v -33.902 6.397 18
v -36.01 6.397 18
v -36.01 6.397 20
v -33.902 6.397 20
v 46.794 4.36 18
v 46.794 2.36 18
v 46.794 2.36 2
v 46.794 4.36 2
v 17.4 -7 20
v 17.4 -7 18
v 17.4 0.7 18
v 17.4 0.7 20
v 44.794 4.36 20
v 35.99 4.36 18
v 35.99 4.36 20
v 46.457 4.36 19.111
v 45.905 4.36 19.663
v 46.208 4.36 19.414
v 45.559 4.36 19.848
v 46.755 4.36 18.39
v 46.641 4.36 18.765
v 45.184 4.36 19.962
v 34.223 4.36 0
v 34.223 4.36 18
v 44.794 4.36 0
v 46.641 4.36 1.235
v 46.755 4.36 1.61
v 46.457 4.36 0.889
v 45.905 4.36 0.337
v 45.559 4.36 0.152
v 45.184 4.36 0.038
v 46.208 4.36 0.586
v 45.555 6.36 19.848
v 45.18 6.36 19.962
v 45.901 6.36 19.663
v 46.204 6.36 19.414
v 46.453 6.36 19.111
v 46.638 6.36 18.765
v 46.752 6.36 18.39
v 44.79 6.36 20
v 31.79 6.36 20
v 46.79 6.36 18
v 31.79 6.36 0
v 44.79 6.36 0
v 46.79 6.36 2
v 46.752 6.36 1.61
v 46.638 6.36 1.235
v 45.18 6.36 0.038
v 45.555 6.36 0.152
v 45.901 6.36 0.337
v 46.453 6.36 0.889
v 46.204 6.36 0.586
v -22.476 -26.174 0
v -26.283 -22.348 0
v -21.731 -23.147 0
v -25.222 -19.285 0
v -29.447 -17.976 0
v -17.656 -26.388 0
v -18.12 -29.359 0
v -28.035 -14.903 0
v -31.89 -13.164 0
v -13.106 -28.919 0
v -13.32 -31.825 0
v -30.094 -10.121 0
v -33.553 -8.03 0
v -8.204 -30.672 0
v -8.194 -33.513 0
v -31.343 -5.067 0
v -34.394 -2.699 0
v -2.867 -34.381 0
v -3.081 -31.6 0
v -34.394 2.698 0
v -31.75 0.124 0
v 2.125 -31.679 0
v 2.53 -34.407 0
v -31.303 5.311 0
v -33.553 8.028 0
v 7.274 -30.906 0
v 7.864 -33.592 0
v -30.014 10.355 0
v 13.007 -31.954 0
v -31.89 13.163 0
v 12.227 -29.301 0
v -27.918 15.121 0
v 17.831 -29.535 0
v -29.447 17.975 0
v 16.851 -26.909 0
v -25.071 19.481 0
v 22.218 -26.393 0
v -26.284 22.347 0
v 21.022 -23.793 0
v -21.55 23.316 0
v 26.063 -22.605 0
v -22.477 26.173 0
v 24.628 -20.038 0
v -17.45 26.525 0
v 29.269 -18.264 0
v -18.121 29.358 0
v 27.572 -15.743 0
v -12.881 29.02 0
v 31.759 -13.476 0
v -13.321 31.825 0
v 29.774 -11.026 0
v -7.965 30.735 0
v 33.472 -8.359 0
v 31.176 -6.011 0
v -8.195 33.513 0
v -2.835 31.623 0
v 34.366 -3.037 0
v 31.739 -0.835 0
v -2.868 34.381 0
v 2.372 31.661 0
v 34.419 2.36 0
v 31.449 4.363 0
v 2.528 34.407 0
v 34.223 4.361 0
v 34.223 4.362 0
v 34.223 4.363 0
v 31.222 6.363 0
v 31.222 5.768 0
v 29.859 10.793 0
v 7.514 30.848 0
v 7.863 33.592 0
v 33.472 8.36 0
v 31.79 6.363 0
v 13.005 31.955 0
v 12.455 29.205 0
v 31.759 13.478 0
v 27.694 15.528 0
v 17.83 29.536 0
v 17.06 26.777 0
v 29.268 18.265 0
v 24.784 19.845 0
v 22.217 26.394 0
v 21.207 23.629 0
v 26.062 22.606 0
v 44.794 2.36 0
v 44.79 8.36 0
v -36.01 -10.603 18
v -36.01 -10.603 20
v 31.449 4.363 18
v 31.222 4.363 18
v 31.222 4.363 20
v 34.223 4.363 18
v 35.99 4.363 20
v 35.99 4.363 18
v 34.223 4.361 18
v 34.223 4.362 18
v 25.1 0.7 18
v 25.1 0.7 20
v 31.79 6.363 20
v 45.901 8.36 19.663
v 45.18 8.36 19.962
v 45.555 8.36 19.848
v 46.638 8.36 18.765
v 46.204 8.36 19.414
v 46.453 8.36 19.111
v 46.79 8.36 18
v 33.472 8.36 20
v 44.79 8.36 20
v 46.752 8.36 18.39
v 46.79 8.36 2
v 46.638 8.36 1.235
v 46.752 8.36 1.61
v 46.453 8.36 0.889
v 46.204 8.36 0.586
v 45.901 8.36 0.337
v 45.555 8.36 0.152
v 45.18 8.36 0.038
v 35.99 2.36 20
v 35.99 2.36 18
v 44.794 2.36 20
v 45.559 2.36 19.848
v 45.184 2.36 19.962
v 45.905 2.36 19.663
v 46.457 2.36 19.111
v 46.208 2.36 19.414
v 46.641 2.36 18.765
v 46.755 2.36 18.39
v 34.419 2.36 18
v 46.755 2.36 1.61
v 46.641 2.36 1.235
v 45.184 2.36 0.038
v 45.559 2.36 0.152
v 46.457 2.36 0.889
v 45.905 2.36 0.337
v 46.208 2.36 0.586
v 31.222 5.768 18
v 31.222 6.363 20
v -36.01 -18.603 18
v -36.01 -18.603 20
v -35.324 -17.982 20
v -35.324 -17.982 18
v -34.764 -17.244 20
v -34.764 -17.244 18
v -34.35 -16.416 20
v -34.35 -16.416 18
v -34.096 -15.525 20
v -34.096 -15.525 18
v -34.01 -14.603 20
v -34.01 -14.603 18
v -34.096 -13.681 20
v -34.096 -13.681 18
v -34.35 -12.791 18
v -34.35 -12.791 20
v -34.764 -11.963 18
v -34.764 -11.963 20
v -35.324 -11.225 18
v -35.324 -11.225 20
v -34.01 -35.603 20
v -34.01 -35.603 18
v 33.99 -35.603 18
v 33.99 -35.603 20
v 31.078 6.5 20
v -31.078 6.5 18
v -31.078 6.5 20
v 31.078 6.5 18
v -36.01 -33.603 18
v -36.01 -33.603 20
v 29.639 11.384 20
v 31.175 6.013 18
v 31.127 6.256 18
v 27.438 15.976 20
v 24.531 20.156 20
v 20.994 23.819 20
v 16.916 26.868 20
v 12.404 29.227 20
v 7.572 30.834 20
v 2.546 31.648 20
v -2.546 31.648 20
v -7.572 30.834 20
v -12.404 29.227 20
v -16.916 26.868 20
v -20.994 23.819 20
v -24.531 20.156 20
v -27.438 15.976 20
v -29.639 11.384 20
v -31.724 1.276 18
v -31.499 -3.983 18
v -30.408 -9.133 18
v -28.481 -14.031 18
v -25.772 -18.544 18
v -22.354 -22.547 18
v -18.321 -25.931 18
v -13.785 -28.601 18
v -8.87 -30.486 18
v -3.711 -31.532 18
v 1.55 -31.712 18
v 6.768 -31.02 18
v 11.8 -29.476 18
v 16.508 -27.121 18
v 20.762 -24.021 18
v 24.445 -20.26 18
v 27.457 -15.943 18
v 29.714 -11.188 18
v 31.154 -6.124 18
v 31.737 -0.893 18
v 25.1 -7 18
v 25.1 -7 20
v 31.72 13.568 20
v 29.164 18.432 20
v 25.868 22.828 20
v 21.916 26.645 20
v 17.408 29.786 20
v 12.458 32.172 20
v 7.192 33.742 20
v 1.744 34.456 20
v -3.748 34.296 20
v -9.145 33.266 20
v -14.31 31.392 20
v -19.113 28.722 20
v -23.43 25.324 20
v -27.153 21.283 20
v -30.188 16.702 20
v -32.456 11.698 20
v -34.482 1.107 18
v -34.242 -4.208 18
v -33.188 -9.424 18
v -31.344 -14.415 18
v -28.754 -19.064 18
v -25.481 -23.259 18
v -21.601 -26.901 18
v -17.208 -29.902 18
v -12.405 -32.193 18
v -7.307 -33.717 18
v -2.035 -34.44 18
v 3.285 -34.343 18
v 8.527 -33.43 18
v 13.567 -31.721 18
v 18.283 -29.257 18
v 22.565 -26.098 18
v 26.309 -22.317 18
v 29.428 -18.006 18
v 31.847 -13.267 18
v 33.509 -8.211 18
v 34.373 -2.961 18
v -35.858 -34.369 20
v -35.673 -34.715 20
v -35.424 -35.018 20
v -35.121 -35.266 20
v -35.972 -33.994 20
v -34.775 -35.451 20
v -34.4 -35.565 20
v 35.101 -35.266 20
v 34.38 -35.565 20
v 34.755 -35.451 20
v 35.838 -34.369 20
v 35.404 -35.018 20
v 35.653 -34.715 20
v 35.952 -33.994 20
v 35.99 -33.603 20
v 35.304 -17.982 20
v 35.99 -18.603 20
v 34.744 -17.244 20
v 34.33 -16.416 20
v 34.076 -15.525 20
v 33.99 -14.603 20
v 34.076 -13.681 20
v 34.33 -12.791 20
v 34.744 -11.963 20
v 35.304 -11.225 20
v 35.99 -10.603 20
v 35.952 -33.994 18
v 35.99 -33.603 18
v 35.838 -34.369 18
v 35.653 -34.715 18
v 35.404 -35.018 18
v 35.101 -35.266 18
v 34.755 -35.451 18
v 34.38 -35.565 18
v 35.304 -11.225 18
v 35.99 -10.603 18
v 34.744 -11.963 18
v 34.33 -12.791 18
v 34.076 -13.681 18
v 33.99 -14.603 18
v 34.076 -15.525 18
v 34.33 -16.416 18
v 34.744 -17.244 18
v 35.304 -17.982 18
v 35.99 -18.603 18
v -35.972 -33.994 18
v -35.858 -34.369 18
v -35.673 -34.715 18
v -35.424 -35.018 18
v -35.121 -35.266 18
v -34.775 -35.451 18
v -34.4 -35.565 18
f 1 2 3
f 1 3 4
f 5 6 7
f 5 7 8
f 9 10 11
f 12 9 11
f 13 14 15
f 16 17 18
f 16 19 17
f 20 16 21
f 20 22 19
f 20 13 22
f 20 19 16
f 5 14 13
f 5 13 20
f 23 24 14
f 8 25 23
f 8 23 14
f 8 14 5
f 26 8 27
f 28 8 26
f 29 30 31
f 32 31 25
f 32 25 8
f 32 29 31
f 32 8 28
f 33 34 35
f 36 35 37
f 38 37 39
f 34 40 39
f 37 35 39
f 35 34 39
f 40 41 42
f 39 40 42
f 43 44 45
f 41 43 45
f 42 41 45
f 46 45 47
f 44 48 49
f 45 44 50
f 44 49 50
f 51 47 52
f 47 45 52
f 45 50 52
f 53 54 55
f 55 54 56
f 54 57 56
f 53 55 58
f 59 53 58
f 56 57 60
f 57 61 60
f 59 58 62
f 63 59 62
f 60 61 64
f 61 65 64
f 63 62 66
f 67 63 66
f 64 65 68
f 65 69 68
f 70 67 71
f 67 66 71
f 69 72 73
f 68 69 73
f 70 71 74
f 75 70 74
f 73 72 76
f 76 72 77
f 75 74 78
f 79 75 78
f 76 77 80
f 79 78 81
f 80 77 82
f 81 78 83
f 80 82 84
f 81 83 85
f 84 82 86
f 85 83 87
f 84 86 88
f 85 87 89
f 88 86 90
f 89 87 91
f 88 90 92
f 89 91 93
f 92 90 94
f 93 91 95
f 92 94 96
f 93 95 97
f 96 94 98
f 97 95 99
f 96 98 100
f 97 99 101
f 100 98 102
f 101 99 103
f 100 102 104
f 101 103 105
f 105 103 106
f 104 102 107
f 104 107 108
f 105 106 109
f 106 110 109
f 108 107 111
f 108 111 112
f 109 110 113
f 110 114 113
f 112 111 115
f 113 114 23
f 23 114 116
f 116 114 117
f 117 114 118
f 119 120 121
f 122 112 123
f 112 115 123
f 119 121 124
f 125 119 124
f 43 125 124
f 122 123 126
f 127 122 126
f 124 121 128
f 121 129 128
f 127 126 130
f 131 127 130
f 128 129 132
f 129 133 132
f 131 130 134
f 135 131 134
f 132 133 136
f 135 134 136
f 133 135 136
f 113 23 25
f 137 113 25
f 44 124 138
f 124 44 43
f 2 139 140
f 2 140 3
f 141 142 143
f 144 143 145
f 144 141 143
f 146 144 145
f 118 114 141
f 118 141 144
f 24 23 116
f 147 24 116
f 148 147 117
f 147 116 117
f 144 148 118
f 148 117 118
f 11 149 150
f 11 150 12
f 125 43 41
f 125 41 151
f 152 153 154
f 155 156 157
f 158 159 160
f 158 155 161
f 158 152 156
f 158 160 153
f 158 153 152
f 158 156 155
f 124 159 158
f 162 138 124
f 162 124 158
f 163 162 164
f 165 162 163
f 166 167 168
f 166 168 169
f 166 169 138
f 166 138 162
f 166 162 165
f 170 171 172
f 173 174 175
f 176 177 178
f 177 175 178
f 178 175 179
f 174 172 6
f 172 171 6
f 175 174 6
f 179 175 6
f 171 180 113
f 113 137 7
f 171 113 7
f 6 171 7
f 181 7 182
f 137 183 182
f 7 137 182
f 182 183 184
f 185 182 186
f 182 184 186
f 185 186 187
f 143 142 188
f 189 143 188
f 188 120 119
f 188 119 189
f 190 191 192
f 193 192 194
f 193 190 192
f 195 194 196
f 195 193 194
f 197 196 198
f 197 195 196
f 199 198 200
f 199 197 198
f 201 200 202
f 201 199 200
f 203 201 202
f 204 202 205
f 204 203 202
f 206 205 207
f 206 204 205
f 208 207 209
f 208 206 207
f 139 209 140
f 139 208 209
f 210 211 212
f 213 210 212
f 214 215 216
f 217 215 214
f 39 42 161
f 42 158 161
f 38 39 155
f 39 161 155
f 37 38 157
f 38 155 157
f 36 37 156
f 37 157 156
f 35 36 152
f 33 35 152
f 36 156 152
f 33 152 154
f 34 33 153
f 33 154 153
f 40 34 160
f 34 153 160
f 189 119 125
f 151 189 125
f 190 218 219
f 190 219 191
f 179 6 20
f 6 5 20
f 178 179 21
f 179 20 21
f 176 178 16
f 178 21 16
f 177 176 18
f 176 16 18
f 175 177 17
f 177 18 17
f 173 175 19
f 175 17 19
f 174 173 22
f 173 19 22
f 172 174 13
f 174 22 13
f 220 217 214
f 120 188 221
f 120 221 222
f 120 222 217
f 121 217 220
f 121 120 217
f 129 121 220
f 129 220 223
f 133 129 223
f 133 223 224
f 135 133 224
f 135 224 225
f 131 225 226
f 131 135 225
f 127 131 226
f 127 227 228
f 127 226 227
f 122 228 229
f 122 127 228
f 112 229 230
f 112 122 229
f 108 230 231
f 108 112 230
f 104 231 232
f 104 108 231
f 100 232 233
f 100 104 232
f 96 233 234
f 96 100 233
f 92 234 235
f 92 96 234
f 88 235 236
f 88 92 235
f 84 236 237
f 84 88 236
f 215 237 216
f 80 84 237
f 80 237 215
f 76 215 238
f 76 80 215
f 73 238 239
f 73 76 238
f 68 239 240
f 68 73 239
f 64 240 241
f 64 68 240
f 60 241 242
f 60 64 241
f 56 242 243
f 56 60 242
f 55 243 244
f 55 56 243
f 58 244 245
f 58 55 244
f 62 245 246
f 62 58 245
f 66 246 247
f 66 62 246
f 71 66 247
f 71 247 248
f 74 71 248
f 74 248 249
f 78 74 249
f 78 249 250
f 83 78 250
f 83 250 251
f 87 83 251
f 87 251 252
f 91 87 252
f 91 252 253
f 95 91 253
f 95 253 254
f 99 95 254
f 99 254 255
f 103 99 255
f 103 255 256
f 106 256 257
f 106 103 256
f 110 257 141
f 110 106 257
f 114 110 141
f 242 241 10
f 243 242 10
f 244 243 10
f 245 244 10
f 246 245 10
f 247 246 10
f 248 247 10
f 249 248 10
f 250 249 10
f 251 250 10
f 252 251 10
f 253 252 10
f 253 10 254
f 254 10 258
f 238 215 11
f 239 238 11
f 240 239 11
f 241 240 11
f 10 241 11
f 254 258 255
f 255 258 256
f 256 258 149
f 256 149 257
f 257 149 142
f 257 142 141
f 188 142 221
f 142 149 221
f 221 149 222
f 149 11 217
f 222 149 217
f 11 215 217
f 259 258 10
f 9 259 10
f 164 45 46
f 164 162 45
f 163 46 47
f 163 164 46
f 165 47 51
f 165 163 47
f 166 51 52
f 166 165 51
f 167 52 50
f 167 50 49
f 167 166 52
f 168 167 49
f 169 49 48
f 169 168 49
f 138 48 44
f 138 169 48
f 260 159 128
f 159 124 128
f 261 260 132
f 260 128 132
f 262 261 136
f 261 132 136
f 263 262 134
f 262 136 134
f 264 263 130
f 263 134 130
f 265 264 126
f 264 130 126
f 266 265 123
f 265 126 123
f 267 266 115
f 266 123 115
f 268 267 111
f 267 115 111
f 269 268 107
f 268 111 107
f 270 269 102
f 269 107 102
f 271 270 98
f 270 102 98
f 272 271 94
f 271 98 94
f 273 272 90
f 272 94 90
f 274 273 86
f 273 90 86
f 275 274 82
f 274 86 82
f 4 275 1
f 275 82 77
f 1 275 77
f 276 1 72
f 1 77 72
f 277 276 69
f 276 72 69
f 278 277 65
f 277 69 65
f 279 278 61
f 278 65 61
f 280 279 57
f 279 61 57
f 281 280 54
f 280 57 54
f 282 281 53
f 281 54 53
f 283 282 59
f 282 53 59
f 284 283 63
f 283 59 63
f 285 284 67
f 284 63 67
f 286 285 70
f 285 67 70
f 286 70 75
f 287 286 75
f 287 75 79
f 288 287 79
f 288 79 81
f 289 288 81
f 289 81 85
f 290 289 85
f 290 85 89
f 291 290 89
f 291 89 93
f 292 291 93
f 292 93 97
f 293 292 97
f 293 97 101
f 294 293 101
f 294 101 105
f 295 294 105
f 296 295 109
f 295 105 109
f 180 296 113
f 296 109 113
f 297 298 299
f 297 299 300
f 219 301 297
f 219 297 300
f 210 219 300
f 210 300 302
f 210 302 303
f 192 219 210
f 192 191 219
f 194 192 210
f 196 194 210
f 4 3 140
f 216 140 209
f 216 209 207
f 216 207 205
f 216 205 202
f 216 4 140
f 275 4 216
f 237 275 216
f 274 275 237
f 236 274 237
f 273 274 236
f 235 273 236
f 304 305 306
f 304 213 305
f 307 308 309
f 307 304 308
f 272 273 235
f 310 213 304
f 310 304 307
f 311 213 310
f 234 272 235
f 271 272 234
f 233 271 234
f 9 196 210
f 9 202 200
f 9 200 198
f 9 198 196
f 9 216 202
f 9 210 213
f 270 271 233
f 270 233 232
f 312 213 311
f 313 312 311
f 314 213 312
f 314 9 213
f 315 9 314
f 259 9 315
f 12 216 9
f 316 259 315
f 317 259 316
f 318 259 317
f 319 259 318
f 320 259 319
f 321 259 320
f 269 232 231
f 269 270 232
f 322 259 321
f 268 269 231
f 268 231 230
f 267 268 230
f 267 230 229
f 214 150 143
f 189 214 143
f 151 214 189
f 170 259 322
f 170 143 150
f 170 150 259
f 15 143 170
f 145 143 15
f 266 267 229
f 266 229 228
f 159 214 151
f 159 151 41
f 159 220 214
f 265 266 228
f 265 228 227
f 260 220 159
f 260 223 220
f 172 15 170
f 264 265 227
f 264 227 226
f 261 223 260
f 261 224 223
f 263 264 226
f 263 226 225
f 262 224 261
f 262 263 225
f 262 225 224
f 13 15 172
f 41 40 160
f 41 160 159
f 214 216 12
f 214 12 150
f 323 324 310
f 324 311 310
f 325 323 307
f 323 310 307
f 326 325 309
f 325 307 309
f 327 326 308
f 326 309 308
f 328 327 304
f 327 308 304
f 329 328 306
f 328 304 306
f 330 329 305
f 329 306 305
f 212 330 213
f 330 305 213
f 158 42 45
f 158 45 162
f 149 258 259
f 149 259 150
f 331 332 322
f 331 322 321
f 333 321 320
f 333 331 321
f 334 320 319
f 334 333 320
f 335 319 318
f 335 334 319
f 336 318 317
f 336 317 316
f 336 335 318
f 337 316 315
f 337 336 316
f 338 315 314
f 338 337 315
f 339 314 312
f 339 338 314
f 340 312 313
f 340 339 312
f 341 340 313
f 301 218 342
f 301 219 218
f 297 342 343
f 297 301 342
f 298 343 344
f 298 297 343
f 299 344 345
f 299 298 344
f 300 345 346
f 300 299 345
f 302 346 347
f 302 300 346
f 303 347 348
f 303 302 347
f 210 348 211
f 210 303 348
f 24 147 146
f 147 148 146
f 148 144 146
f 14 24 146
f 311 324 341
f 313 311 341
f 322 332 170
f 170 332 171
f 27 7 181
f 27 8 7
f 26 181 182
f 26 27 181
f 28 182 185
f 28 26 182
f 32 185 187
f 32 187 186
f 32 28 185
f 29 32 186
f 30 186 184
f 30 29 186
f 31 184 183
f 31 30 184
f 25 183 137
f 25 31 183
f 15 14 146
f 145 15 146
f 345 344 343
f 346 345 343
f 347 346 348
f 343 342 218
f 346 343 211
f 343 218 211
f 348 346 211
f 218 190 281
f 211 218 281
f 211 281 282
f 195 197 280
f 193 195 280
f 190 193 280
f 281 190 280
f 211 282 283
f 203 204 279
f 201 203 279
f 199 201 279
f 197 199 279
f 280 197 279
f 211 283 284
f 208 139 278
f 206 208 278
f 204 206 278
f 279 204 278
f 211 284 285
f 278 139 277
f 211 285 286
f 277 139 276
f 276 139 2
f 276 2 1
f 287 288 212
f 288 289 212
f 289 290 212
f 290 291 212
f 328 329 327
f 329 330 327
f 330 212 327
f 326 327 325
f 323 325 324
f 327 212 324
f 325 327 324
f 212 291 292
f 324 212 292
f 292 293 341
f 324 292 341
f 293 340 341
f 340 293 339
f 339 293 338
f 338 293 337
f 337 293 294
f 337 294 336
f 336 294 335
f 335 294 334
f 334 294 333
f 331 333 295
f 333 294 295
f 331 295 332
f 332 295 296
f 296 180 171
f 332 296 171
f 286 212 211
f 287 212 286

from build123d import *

# Parameters (mm, degrees)
CYLINDER020_R     = 5
CYLINDER020_DEPTH = 5
CYLINDER019_R     = 5
CYLINDER019_DEPTH = 5
BOX005_W          = 15
BOX005_H          = 2
BOX005_DEPTH      = 20
FILLET002_R       = 2
BOX002_W          = 10
BOX002_H          = 2
BOX002_DEPTH      = 20
BOX_W             = 80
BOX_H             = 39
BOX_DEPTH         = 25
CYLINDER002_R     = 31.75
CYLINDER002_DEPTH = 25
BOX001_W          = 7.7
BOX001_H          = 7.7
BOX001_DEPTH      = 10
BOX007_W          = 72
BOX007_H          = 42
BOX007_DEPTH      = 2
CYLINDER_R        = 31.75
CYLINDER_DEPTH    = 18
CYLINDER001_R     = 34.5
CYLINDER001_DEPTH = 20
FILLET001_R       = 2
BOX006_W          = 15
BOX006_H          = 2
BOX006_DEPTH      = 20
FILLET003_R       = 2


with BuildPart() as cylinder020:
    # Cylinder020 → Cylinder020 (new body)
    with BuildSketch(Plane(origin=(-39.01, -14.6034, 15), x_dir=(1, 0, 0), z_dir=(0, 0, 1))):
        Circle(CYLINDER020_R)
    extrude(amount=CYLINDER020_DEPTH)


with BuildPart() as fusion013:
    # Cylinder019 → Cylinder019 (new body)
    with BuildSketch(Plane(origin=(38.99, -14.6034, 15), x_dir=(1, 0, 0), z_dir=(0, 0, 1))):
        Circle(CYLINDER019_R)
    extrude(amount=CYLINDER019_DEPTH)

    # Fusion013: union Cylinder020
    add(cylinder020.part)


with BuildPart() as fillet002:
    # Box005 → Box005 (new body)
    with BuildSketch(Plane(origin=(31.79, 6.35995, 0), x_dir=(1, 0, 0), z_dir=(0, 0, 1))):
        with Locations((7.5, 1)):
            Rectangle(BOX005_W, BOX005_H)
    extrude(amount=BOX005_DEPTH)

    # Fillet002
    fillet002_edges = [fillet002.edges().sort_by_distance(p)[0] for p in [
        (46.79, 7.35995, 20),
        (46.79, 7.35995, 0),
    ]]
    fillet(fillet002_edges, radius=FILLET002_R)


with BuildPart() as kostka002:
    # Box002 → Box002 (new body)
    with BuildSketch(Plane(origin=(31.22162, 4.362905, 0), x_dir=(1, 0, 0), z_dir=(0, 0, 1))):
        with Locations((5, 1)):
            Rectangle(BOX002_W, BOX002_H)
    extrude(amount=BOX002_DEPTH)


with BuildPart() as kostka:
    # Box → Box (new body)
    with BuildSketch(Plane(origin=(-38, -32.5, 0), x_dir=(1, 0, 0), z_dir=(0, 0, 1))):
        with Locations((40, 19.5)):
            Rectangle(BOX_W, BOX_H)
    extrude(amount=BOX_DEPTH)


with BuildPart() as cut001:
    # Cylinder002 → Cylinder002 (new body)
    with BuildSketch(Plane.XY):
        Circle(CYLINDER002_R)
    extrude(amount=CYLINDER002_DEPTH)

    # Cut001: cut Kostka
    add(kostka.part, mode=Mode.SUBTRACT)


with BuildPart() as kostka001:
    # Box001 → Box001 (new body)
    with BuildSketch(Plane(origin=(25.1, -7, 10), x_dir=(0, 1, 0), z_dir=(0, 0, 1))):
        with Locations((3.85, 3.85)):
            Rectangle(BOX001_W, BOX001_H)
    extrude(amount=BOX001_DEPTH)


with BuildPart() as kostka007:
    # Box007 → Box007 (new body)
    with BuildSketch(Plane(origin=(-36.01, -35.6034, 18), x_dir=(1, 0, 0), z_dir=(0, 0, 1))):
        with Locations((36, 21)):
            Rectangle(BOX007_W, BOX007_H)
    extrude(amount=BOX007_DEPTH)


with BuildPart() as cylinder:
    # Cylinder → Cylinder (new body)
    with BuildSketch(Plane.XY):
        Circle(CYLINDER_R)
    extrude(amount=CYLINDER_DEPTH)


with BuildPart() as fusion001:
    # Cylinder001 → Cylinder001 (new body)
    with BuildSketch(Plane.XY):
        Circle(CYLINDER001_R)
    extrude(amount=CYLINDER001_DEPTH)

    # Cut: cut Cylinder
    add(cylinder.part, mode=Mode.SUBTRACT)

    # Fusion: union Kostka007
    add(kostka007.part)

    # Cut002: cut Kostka001
    add(kostka001.part, mode=Mode.SUBTRACT)

    # Cut003: cut Cut001
    add(cut001.part, mode=Mode.SUBTRACT)

    # Cut004: cut Kostka002
    add(kostka002.part, mode=Mode.SUBTRACT)

    # Fillet001
    fillet001_edges = [fusion001.edges().sort_by_distance(p)[0] for p in [
        (-36.01, -35.6034, 19),
        (35.99, -35.6034, 19),
    ]]
    fillet(fillet001_edges, radius=FILLET001_R)

    # Fusion001: union Fillet002
    add(fillet002.part)


with BuildPart() as base:
    # Box006 → Box006 (new body)
    with BuildSketch(Plane(origin=(31.7936, 2.359946, 0), x_dir=(1, 0, 0), z_dir=(0, 0, 1))):
        with Locations((7.5, 1)):
            Rectangle(BOX006_W, BOX006_H)
    extrude(amount=BOX006_DEPTH)

    # Fillet003
    fillet003_edges = [base.edges().sort_by_distance(p)[0] for p in [
        (46.7936, 3.359946, 20),
        (46.7936, 3.359946, 0),
    ]]
    fillet(fillet003_edges, radius=FILLET003_R)

    # Fusion002: union Fusion001
    add(fusion001.part)

    # Cut015: cut Fusion013
    add(fusion013.part, mode=Mode.SUBTRACT)


solid = base.part
